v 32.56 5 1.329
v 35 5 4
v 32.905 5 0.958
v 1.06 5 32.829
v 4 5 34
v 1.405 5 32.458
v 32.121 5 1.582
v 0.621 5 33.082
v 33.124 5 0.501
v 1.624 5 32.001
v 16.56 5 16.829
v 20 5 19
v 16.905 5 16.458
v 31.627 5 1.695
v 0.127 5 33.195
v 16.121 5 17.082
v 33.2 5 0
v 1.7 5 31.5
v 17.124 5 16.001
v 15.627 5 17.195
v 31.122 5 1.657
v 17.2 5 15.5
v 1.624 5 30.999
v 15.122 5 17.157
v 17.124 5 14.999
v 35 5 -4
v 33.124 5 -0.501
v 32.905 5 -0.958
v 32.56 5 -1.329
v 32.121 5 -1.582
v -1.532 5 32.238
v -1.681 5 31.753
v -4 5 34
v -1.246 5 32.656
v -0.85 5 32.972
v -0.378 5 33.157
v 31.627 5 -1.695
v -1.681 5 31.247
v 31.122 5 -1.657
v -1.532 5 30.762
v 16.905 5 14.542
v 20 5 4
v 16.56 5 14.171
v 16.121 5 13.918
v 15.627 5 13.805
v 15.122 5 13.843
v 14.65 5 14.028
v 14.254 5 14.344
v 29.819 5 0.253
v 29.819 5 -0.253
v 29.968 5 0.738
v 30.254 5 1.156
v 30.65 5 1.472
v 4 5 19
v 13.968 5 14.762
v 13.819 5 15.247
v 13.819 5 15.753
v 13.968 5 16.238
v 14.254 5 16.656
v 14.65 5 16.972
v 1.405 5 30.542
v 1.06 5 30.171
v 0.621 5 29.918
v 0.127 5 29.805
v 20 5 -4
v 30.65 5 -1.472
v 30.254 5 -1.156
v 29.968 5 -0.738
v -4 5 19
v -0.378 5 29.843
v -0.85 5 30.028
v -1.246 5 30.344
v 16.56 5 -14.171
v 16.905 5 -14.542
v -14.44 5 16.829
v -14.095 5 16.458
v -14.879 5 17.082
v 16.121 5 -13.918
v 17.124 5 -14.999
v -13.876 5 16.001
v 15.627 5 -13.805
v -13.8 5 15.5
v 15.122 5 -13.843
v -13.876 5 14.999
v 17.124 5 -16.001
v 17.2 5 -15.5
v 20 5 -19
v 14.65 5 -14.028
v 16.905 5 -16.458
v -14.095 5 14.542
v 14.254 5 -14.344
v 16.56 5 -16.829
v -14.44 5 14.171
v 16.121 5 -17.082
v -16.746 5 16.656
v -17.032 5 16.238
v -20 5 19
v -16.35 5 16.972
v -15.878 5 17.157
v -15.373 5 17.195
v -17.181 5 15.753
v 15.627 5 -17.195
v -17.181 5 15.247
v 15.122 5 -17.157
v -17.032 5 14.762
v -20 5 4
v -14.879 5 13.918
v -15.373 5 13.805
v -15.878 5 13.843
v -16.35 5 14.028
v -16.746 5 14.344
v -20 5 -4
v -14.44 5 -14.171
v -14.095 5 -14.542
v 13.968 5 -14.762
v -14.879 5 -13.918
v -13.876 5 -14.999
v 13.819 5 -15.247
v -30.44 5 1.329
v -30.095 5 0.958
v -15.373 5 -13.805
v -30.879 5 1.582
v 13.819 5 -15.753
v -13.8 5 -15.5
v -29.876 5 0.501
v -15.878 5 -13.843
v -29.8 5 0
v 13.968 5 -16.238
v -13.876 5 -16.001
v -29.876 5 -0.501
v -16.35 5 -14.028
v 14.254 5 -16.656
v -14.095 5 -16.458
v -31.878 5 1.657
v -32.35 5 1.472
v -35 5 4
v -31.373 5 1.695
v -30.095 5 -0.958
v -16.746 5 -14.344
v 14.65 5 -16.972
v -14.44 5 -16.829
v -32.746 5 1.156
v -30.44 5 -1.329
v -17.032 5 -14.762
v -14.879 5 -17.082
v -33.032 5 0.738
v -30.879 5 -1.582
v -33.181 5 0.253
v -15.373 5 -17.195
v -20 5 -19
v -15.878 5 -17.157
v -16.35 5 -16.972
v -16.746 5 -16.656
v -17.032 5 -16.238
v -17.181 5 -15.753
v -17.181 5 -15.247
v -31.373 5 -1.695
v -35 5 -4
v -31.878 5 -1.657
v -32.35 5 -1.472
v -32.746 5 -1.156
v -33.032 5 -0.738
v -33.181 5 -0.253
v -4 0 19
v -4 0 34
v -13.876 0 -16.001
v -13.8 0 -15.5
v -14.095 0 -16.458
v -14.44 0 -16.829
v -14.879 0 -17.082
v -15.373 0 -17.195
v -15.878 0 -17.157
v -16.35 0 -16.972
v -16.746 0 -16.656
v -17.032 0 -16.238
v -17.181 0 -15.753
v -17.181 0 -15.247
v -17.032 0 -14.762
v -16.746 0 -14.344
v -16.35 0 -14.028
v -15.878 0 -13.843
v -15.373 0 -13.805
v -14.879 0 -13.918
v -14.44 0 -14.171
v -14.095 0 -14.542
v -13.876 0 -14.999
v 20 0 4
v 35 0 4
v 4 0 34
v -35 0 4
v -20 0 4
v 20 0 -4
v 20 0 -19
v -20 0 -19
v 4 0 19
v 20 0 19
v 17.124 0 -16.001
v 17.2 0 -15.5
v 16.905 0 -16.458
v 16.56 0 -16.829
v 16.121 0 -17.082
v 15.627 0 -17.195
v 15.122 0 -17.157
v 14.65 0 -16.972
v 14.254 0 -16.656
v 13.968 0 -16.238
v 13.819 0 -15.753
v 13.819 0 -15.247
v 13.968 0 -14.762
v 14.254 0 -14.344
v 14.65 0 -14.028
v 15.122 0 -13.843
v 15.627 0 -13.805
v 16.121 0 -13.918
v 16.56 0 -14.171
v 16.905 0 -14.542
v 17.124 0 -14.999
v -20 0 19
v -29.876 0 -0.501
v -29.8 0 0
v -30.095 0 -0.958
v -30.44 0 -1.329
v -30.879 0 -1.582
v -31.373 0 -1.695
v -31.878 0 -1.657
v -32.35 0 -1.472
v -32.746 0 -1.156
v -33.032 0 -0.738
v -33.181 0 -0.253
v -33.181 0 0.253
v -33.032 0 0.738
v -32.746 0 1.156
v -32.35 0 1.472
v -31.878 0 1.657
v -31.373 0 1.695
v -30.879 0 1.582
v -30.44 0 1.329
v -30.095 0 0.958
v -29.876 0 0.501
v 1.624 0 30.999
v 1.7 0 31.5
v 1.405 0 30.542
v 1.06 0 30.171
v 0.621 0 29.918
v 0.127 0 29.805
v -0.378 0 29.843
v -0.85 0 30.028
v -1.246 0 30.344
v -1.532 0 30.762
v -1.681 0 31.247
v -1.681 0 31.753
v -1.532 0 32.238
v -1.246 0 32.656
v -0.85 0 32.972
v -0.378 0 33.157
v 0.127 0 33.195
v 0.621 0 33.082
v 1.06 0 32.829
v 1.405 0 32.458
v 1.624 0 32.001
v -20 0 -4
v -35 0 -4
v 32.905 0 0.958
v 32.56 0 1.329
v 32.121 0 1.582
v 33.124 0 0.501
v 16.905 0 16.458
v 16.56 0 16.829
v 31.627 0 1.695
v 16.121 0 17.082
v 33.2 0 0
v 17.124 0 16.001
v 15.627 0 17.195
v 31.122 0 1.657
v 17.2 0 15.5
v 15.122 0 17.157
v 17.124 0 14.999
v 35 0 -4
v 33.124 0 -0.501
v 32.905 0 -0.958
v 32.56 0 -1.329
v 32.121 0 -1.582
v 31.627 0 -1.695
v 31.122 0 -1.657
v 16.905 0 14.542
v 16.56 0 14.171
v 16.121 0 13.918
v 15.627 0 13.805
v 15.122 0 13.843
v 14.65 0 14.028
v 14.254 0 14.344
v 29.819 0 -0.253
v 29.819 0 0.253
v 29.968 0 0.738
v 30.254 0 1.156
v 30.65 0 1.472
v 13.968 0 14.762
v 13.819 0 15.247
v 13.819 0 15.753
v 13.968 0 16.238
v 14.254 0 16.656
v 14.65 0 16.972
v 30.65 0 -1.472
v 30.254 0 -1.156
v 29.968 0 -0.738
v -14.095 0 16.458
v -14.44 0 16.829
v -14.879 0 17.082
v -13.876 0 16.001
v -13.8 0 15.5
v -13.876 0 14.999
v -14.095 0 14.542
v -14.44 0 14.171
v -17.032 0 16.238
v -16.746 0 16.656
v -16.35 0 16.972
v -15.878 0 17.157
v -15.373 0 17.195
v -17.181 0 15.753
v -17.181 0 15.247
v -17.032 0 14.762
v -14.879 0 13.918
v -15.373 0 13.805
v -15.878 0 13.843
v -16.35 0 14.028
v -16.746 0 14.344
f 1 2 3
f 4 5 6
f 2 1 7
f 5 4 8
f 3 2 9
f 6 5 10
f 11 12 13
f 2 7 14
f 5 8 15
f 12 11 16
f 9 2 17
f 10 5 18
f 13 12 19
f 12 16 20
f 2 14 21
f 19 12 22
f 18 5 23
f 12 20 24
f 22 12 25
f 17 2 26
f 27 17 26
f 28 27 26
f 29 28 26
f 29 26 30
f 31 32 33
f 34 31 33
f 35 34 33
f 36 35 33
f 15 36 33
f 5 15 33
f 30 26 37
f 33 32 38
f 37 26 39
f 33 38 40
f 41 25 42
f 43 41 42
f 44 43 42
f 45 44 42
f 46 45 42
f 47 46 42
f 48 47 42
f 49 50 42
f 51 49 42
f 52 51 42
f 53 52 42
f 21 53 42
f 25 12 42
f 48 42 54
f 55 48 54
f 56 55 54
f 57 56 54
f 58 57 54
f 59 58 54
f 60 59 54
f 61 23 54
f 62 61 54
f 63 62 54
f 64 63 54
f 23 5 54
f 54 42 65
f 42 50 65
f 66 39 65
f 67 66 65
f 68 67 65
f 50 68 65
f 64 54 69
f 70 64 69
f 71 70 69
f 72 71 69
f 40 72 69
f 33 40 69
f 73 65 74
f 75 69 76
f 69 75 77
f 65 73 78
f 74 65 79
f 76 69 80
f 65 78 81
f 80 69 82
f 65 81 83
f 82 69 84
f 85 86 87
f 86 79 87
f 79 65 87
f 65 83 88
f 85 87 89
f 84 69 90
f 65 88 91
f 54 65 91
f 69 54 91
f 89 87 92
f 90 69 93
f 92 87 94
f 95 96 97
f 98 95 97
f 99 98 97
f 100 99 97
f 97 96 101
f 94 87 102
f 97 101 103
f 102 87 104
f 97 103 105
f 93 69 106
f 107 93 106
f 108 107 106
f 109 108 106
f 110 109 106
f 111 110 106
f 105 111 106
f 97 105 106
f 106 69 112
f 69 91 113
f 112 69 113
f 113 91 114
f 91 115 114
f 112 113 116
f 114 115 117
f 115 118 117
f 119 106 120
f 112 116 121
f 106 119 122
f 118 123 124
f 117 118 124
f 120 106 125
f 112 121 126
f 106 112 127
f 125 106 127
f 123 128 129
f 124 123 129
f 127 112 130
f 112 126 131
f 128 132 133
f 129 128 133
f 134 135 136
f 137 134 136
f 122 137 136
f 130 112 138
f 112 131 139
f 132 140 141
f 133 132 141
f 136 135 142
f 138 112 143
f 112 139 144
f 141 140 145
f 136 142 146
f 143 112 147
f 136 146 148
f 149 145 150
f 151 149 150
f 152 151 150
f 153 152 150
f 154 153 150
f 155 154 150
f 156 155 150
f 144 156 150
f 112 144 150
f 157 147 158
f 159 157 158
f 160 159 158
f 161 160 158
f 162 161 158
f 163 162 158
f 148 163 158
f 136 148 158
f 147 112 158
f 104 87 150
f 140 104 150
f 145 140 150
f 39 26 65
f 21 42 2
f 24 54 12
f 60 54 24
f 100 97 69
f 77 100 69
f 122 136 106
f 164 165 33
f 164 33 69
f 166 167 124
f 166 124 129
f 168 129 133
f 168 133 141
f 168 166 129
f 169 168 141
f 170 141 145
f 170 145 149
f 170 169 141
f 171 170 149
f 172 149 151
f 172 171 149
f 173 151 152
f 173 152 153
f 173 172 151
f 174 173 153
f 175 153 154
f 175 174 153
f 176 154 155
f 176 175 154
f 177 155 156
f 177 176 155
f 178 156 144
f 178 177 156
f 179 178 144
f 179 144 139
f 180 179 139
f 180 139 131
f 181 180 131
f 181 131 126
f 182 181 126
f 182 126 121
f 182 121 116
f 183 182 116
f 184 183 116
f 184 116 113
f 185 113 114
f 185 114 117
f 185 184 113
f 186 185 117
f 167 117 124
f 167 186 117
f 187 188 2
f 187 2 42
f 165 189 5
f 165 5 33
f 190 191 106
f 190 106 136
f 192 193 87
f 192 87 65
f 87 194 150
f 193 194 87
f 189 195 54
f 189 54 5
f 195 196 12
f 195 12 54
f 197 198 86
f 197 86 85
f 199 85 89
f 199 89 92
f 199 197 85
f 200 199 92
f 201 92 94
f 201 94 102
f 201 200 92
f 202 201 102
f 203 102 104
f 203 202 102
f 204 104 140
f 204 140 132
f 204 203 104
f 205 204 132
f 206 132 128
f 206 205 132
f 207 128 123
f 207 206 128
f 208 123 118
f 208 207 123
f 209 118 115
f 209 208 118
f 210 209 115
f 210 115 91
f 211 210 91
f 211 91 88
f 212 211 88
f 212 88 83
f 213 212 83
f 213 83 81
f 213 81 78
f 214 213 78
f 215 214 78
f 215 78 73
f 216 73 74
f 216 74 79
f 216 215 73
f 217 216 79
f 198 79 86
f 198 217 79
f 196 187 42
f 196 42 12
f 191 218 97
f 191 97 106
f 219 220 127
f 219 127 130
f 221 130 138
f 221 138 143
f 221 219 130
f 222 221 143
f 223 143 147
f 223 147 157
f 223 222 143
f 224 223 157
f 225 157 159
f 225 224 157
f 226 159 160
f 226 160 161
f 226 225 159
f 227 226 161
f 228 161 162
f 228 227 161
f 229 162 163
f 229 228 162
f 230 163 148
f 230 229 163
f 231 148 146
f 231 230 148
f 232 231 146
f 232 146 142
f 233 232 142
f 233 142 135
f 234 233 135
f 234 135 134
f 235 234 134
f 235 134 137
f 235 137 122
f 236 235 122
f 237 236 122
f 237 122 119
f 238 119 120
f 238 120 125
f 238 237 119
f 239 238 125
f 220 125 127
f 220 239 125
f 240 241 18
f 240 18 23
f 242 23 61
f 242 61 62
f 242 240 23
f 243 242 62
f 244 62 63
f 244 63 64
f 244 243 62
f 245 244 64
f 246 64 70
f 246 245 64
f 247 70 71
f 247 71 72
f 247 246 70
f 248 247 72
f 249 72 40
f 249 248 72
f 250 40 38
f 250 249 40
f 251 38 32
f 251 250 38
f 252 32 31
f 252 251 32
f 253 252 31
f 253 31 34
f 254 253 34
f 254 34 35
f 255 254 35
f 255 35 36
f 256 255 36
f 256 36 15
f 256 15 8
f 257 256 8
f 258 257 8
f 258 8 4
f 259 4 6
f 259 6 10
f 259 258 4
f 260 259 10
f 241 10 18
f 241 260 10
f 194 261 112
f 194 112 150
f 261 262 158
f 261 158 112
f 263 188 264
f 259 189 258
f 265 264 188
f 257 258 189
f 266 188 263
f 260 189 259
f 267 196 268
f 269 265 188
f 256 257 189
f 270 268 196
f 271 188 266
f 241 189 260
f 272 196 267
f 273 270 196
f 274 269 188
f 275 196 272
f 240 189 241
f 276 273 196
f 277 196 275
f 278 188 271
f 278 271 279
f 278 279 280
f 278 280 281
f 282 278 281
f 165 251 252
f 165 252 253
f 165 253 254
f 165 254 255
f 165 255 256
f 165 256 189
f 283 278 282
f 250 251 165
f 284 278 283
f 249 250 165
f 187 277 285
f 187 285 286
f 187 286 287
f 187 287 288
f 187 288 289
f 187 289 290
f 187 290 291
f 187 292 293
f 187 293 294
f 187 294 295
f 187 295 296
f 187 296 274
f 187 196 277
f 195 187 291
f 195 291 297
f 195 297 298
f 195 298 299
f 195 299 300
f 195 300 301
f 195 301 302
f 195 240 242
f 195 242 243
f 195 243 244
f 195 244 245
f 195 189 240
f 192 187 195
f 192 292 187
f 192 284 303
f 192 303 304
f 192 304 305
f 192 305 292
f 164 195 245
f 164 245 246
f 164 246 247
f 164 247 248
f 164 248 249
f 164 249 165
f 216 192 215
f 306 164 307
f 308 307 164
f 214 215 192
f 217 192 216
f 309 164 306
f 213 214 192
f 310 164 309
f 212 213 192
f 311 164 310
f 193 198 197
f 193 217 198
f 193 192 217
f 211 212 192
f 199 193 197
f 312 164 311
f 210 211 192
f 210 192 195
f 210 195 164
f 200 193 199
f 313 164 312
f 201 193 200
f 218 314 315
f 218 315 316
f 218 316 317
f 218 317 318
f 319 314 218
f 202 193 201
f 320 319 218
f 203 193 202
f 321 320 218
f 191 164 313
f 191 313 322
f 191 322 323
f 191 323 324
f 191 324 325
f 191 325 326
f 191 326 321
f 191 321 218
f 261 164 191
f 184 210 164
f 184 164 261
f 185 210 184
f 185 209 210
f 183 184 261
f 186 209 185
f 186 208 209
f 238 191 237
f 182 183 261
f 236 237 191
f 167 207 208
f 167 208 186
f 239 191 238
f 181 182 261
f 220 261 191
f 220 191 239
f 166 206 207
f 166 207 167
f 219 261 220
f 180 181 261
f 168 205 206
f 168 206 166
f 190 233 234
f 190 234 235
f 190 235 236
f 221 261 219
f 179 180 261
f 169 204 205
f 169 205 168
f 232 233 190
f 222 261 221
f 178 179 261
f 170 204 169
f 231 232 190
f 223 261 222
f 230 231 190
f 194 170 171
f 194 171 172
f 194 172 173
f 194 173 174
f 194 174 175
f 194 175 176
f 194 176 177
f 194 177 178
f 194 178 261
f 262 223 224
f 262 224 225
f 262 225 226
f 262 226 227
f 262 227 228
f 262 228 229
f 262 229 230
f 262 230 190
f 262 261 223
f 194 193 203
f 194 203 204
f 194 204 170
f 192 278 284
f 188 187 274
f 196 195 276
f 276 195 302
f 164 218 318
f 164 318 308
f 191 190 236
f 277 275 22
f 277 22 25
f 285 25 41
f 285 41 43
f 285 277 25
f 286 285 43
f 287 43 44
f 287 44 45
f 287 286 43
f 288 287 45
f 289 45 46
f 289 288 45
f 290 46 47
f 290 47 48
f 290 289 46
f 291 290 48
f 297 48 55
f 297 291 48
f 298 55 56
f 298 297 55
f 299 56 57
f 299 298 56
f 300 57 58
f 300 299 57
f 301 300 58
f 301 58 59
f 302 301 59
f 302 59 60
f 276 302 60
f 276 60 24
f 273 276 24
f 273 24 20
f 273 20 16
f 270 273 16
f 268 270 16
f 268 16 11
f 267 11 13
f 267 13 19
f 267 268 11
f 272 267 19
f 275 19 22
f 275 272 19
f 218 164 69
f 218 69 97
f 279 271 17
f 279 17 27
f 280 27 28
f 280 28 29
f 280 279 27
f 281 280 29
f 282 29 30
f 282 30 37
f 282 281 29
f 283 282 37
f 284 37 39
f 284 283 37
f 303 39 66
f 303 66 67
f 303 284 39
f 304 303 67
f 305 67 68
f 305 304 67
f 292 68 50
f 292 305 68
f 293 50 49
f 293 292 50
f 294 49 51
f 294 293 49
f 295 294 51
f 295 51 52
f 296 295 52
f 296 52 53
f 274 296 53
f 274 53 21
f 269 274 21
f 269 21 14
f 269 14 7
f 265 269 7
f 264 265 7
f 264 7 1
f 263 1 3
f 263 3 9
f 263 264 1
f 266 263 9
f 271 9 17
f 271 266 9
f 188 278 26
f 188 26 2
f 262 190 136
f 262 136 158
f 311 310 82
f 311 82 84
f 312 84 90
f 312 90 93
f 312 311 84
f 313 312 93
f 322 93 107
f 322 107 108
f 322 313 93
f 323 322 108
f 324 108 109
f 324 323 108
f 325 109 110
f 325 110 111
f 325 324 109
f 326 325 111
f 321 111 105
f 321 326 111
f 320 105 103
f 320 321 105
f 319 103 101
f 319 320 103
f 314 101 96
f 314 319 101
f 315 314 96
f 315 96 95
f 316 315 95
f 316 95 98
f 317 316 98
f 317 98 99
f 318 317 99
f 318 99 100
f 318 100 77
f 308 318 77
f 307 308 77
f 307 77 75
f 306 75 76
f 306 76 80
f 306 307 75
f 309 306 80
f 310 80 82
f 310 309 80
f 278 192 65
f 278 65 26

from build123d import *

# Parameters (mm, degrees)
CROQUIS1_R              = 1.7
SALIENTE_EXTRUIR1_DEPTH = 5


with BuildPart() as part:
    # Croquis1 → Saliente-Extruir1 (new body)
    with BuildSketch(Plane(origin=(0, 0, 0), x_dir=(1, 0, 0), z_dir=(0, 1, 0))):
        Polygon((-35, 4), (-20, 4), (-20, 19), (20, 19), (20, 4), (35, 4), (35, -4), (20, -4), (20, -19), (4, -19), (4, -34), (-4, -34), (-4, -19), (-20, -19), (-20, -4), (-35, -4), align=None)
        with Locations((-15.5, 15.5)):
            Circle(CROQUIS1_R, mode=Mode.SUBTRACT)
        with Locations((15.5, 15.5)):
            Circle(CROQUIS1_R, mode=Mode.SUBTRACT)
        with Locations((15.5, -15.5)):
            Circle(CROQUIS1_R, mode=Mode.SUBTRACT)
        with Locations((-15.5, -15.5)):
            Circle(CROQUIS1_R, mode=Mode.SUBTRACT)
        with Locations((-31.5, 0)):
            Circle(CROQUIS1_R, mode=Mode.SUBTRACT)
        with Locations((0, -31.5)):
            Circle(CROQUIS1_R, mode=Mode.SUBTRACT)
        with Locations((31.5, 0)):
            Circle(CROQUIS1_R, mode=Mode.SUBTRACT)
    extrude(amount=SALIENTE_EXTRUIR1_DEPTH)


solid = part.part
